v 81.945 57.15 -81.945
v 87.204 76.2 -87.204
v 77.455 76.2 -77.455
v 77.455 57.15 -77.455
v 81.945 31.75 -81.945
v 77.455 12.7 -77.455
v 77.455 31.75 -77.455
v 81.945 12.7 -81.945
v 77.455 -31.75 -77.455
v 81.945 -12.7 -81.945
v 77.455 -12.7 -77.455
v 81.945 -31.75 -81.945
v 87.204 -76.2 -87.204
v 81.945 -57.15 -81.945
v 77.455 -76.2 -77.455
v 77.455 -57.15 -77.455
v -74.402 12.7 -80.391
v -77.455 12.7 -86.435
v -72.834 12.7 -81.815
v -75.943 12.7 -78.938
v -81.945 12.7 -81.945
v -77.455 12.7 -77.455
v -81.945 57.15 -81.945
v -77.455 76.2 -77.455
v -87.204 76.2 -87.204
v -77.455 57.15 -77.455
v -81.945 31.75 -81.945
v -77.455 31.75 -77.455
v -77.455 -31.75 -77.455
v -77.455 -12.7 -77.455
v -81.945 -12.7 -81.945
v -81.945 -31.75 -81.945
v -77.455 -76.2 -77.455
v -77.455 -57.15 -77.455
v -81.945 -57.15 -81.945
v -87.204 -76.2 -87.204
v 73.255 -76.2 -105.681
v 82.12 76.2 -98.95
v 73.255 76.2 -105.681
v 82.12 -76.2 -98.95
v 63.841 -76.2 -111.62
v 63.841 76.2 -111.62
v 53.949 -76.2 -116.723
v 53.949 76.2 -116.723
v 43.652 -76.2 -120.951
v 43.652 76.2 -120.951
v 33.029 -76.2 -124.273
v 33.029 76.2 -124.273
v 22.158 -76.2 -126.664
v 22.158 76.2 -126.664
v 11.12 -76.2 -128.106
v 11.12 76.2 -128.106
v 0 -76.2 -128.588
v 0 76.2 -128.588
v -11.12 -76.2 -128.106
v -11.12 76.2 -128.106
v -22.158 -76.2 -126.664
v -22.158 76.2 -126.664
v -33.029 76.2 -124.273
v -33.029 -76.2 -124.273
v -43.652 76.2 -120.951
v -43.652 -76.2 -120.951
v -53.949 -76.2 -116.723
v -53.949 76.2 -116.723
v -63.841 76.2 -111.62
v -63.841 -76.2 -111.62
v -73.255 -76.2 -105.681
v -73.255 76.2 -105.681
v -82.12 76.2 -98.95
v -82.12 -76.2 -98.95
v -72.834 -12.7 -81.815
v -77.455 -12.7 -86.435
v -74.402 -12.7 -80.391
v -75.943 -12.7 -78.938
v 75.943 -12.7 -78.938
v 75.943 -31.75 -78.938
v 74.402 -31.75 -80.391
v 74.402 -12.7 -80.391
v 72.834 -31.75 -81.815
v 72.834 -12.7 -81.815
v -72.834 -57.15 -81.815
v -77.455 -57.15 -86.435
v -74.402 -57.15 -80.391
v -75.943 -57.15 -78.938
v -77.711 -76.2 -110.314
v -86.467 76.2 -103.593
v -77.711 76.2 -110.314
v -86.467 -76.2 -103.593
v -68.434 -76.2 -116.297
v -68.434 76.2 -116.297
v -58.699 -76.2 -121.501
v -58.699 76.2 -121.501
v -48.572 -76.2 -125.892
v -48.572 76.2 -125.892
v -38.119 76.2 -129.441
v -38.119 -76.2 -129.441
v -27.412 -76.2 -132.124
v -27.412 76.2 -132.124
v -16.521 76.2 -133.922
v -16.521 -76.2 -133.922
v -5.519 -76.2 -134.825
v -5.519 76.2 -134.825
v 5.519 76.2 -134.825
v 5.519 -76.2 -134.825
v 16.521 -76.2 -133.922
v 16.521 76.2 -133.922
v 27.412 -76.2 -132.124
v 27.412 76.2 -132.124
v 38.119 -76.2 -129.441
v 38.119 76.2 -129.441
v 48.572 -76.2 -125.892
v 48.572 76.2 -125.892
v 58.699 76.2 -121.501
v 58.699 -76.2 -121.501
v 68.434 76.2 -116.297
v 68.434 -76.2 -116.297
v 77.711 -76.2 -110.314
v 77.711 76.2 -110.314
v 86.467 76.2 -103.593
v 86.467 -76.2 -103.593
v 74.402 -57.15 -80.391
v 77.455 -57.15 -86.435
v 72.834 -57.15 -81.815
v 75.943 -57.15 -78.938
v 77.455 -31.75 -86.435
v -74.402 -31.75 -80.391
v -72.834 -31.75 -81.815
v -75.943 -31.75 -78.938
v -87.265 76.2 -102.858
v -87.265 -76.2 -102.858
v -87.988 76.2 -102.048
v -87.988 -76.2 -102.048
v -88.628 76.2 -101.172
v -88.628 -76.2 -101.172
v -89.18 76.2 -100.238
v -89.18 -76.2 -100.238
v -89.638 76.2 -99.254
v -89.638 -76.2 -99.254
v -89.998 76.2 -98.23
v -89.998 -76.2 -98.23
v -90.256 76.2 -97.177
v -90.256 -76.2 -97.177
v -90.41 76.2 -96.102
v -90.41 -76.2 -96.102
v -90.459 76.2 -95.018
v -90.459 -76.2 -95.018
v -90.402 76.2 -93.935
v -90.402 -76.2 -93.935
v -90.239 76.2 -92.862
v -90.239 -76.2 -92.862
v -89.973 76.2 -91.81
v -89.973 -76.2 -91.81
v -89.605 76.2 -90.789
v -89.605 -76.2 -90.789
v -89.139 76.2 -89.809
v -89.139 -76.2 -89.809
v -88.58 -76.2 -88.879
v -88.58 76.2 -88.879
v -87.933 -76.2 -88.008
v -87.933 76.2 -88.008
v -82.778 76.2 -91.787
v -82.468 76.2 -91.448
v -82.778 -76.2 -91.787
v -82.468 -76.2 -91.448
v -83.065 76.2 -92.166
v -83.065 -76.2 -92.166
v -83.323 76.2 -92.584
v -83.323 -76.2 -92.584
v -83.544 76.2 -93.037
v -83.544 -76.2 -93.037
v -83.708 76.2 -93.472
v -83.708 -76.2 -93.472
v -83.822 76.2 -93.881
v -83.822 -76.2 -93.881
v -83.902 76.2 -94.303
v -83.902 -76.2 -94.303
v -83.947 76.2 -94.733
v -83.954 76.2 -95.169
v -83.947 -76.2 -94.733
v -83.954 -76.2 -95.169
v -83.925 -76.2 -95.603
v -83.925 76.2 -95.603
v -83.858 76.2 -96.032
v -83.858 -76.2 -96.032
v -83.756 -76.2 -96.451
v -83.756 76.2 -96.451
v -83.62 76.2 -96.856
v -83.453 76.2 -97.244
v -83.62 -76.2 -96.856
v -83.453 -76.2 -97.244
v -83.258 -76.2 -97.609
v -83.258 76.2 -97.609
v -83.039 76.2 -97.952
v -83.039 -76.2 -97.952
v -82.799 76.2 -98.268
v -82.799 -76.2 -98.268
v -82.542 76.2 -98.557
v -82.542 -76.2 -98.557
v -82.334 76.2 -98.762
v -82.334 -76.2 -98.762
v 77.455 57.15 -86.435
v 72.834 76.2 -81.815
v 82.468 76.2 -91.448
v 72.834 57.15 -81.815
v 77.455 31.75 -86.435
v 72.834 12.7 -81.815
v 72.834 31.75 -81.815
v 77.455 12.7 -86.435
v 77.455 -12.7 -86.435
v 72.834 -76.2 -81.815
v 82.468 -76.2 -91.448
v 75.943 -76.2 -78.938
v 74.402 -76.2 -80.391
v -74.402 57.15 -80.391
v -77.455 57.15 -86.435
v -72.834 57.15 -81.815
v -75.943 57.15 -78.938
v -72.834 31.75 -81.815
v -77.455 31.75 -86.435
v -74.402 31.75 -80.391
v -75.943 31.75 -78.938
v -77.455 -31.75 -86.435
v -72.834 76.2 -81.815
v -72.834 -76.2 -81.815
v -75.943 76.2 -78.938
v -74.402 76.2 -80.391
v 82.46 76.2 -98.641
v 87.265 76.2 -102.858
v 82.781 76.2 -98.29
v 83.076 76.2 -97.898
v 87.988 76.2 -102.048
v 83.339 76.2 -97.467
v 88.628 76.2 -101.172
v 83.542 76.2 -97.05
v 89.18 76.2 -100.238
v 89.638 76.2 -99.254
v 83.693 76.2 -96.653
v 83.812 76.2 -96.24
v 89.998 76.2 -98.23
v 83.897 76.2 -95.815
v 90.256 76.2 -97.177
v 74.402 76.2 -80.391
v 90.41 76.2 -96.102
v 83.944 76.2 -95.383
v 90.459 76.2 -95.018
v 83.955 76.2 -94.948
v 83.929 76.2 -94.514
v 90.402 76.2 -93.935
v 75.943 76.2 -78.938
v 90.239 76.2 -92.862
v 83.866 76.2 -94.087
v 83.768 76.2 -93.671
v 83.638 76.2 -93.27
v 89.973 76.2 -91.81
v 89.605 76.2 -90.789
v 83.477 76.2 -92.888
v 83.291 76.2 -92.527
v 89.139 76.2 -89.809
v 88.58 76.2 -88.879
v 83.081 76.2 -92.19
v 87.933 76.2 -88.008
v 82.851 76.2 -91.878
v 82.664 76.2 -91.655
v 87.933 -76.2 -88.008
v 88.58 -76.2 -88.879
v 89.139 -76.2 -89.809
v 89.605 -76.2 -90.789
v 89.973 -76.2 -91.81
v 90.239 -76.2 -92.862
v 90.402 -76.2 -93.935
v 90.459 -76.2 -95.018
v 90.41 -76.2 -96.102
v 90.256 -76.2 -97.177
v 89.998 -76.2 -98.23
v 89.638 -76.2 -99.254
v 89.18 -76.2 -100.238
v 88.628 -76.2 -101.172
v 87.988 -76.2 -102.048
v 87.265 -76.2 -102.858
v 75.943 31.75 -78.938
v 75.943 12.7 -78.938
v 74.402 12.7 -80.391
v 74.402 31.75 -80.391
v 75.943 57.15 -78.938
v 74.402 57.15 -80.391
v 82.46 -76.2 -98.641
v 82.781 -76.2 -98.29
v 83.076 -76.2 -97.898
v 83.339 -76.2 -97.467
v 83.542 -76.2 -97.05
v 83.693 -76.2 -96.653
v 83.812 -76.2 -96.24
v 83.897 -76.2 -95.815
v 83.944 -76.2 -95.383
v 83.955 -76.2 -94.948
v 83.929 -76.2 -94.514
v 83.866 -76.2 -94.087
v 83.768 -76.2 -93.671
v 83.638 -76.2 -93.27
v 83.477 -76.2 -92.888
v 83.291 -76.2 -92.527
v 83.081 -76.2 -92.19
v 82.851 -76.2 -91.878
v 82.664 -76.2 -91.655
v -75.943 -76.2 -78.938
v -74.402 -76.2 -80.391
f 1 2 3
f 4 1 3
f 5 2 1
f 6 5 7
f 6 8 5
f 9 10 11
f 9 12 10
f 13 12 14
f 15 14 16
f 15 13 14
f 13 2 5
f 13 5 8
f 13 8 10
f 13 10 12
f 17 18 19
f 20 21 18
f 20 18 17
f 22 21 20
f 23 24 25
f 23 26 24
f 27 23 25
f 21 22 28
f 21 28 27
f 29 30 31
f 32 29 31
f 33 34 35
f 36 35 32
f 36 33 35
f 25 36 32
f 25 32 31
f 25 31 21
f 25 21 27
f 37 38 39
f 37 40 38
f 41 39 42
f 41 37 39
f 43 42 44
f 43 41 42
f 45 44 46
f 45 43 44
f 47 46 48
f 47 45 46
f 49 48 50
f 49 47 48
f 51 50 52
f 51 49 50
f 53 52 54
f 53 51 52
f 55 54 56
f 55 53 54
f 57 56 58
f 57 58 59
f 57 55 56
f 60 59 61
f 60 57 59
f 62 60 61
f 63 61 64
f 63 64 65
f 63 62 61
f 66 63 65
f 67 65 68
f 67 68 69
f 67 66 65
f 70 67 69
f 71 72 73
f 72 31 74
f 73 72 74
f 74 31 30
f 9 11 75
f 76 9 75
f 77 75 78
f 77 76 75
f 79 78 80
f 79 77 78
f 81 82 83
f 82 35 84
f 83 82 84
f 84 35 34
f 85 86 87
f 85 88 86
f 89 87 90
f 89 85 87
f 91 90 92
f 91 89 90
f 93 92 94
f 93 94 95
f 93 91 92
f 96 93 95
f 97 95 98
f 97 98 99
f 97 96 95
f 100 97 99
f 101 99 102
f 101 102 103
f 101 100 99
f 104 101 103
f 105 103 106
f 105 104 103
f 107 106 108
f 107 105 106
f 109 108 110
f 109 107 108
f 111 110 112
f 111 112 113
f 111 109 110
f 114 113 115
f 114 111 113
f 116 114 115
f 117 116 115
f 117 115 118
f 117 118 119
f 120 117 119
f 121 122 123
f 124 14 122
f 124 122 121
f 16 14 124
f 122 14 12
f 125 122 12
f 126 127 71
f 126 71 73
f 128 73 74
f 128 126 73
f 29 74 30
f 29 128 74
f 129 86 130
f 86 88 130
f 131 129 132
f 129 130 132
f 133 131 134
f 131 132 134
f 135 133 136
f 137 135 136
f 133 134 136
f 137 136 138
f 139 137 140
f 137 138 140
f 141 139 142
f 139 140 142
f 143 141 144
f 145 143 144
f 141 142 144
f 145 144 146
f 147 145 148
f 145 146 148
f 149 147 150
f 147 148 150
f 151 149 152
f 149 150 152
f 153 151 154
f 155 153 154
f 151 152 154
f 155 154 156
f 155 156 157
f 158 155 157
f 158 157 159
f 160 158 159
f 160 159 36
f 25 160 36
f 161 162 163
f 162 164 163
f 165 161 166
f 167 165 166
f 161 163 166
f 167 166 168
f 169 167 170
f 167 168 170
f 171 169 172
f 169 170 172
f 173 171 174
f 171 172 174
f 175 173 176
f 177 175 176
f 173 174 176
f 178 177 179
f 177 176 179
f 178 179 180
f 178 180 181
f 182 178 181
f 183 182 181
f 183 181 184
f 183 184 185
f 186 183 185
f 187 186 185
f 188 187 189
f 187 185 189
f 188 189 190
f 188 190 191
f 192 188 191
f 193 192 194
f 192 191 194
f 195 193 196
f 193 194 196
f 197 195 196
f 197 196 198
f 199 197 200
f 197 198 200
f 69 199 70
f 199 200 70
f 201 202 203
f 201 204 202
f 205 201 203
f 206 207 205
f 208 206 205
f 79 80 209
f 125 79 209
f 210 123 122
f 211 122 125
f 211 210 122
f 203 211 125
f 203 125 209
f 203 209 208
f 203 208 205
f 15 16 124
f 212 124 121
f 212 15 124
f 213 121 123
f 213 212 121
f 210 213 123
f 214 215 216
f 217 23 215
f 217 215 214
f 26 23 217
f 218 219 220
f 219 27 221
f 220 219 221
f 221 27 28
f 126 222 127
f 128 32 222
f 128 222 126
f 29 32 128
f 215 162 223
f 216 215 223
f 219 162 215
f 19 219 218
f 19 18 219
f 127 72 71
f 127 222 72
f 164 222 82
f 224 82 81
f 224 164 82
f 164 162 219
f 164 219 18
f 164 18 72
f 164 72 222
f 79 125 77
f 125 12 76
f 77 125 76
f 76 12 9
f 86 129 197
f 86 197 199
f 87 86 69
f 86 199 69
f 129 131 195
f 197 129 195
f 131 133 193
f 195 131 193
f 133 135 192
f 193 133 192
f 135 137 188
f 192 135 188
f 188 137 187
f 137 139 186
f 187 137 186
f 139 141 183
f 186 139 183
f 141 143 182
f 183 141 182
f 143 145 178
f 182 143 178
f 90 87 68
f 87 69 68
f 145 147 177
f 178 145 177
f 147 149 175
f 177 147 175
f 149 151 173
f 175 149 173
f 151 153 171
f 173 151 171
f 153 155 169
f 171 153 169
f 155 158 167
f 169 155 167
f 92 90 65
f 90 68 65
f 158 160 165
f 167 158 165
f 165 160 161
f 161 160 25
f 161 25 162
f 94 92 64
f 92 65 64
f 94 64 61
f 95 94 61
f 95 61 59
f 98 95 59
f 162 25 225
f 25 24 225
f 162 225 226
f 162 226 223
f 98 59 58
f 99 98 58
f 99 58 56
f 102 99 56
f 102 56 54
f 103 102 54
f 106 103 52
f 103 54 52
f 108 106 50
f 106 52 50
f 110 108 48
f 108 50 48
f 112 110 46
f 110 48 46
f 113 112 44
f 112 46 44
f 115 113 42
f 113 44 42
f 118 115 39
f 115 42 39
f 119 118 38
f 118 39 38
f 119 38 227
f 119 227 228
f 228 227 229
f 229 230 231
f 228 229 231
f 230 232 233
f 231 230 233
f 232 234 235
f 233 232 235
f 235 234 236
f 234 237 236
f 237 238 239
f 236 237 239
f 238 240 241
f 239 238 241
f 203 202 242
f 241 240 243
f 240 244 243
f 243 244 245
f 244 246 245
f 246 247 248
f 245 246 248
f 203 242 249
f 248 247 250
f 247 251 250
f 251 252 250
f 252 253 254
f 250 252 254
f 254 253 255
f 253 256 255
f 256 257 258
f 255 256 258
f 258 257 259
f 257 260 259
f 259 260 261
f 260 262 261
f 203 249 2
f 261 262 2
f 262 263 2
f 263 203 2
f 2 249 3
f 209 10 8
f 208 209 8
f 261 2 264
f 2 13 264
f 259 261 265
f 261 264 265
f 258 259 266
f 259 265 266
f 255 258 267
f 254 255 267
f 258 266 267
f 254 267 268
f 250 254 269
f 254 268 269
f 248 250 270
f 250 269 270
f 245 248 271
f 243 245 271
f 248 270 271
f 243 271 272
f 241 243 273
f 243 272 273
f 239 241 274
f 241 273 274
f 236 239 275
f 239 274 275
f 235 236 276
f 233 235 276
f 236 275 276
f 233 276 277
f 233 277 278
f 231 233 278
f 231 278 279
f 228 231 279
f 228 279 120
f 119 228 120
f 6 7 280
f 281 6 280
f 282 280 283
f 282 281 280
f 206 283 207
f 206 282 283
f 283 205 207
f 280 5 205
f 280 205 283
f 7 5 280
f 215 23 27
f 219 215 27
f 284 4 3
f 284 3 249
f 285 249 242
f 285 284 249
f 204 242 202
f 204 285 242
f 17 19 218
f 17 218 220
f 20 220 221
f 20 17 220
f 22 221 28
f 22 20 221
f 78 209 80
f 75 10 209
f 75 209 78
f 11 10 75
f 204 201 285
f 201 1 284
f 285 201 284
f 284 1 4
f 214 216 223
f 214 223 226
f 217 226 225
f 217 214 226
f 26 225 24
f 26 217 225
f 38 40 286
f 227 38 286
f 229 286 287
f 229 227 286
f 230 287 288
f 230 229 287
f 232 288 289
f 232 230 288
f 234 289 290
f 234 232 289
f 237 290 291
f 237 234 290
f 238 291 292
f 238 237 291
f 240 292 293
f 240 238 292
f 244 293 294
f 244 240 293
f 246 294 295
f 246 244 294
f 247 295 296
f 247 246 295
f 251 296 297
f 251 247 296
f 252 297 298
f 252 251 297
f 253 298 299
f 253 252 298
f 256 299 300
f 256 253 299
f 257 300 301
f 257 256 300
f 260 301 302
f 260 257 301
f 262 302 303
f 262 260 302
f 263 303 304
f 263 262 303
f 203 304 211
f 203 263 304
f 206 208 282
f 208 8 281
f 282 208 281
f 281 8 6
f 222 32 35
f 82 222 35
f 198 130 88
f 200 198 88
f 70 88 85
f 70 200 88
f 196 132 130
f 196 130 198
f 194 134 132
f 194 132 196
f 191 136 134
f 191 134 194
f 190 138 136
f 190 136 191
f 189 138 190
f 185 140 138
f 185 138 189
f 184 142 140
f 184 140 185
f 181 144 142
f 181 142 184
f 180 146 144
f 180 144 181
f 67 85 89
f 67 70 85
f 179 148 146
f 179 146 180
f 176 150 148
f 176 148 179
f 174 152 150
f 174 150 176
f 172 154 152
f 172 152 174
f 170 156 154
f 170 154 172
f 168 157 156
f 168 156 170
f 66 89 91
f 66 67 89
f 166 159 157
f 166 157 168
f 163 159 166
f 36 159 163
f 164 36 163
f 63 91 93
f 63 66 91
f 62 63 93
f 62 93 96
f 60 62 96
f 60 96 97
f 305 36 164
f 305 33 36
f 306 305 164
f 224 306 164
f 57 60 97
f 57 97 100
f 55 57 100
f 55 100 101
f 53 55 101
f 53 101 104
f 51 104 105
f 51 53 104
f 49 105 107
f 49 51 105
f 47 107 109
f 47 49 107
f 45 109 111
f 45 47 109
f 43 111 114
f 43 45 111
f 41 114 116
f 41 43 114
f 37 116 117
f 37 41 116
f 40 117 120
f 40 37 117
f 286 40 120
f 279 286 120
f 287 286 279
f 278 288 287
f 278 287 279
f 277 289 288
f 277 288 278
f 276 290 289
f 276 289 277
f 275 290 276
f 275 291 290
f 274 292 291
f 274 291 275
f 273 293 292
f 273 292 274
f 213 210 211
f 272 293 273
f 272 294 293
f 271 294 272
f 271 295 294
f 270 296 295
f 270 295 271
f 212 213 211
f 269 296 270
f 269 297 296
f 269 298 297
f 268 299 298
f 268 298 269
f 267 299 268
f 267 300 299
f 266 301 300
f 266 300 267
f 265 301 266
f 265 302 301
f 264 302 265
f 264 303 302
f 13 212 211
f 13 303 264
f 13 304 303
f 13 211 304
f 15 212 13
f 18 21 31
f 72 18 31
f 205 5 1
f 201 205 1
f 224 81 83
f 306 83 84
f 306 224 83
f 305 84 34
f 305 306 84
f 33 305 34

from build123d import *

# Parameters (mm, degrees)
F1_DEPTH = 76.2
F2_R     = 11.1125
F3_R     = 5.08
F4_W     = 25.4
F4_H     = 9.6059094062
F4_H_2   = 10.5453204632
F5_DEPTH = 25.4
F6_W     = 25.4
F6_H     = 12.6698460698
F6_H_2   = 15.3897032142
F7_DEPTH = 25.4


with BuildPart() as f1:
    # F0 (on Front) → F1 (new body, symmetric)
    with BuildSketch(Plane.XZ):
        with BuildLine():
            ThreePointArc((85.5011615648, -96.0432013591), (0, -128.5875), (-85.5011615648, -96.0432013591))
            ThreePointArc((-85.5011615648, -96.0432013591), (-85.91339025, -95.6746284654), (-86.3240301315, -95.3042862526))
            Line((-86.3240301315, -95.3042862526), (-72.8343228145, -81.8145789356))
            ThreePointArc((-72.8343228145, -81.8145789356), (-75.1761291277, -79.6681461792), (-77.4547090442, -77.4547090442))
            Line((-77.4547090442, -77.4547090442), (-90.9250932258, -90.9250932258))
            Line((-90.9250932258, -90.9250932258), (-95.4152212864, -95.4152212864))
            ThreePointArc((-95.4152212864, -95.4152212864), (0, -134.9375), (95.4152212864, -95.4152212864))
            Line((95.4152212864, -95.4152212864), (77.4547090442, -77.4547090442))
            ThreePointArc((77.4547090442, -77.4547090442), (75.1761291277, -79.6681461792), (72.8343228145, -81.8145789356))
            Line((72.8343228145, -81.8145789356), (86.3240301315, -95.3042862526))
            ThreePointArc((86.3240301315, -95.3042862526), (85.91339025, -95.6746284654), (85.5011615648, -96.0432013591))
        make_face()
    extrude(amount=F1_DEPTH, both=True)

    # F2
    f2_edges = [f1.edges().sort_by_distance(p)[0] for p in [
        (95.415221, 0, -95.415221),
        (-95.415221, 0, -95.415221),
    ]]
    fillet(f2_edges, radius=F2_R)

    # F3
    f3_edges = [f1.edges().sort_by_distance(p)[0] for p in [
        (-86.32403, 0, -95.304286),
        (86.32403, 0, -95.304286),
    ]]
    fillet(f3_edges, radius=F3_R)

    # F4 (on face) → F5 (cut)
    with BuildSketch(Plane(origin=(0, 0, 0), x_dir=(0, 1, 0), z_dir=(0.7071067812, 0, 0.7071067812))):
        with Locations((-44.45, -111.0845452969)):
            Rectangle(F4_W, F4_H)
        with Locations((44.45, -111.0845452969)):
            Rectangle(F4_W, F4_H)
        with Locations((0, -110.6148397684)):
            Rectangle(F4_W, F4_H_2)
    extrude(amount=-F5_DEPTH, mode=Mode.SUBTRACT)

    # F6 (on face) → F7 (cut)
    with BuildSketch(Plane(origin=(0, 0, 0), x_dir=(0, -1, 0), z_dir=(-0.7071067812, 0, 0.7071067812))):
        with Locations((-44.45, -109.5525769651)):
            Rectangle(F6_W, F6_H)
        with Locations((44.45, -109.5525769651)):
            Rectangle(F6_W, F6_H)
        with Locations((0, -108.1926483929)):
            Rectangle(F6_W, F6_H_2)
    extrude(amount=-F7_DEPTH, mode=Mode.SUBTRACT)


solid = f1.part
